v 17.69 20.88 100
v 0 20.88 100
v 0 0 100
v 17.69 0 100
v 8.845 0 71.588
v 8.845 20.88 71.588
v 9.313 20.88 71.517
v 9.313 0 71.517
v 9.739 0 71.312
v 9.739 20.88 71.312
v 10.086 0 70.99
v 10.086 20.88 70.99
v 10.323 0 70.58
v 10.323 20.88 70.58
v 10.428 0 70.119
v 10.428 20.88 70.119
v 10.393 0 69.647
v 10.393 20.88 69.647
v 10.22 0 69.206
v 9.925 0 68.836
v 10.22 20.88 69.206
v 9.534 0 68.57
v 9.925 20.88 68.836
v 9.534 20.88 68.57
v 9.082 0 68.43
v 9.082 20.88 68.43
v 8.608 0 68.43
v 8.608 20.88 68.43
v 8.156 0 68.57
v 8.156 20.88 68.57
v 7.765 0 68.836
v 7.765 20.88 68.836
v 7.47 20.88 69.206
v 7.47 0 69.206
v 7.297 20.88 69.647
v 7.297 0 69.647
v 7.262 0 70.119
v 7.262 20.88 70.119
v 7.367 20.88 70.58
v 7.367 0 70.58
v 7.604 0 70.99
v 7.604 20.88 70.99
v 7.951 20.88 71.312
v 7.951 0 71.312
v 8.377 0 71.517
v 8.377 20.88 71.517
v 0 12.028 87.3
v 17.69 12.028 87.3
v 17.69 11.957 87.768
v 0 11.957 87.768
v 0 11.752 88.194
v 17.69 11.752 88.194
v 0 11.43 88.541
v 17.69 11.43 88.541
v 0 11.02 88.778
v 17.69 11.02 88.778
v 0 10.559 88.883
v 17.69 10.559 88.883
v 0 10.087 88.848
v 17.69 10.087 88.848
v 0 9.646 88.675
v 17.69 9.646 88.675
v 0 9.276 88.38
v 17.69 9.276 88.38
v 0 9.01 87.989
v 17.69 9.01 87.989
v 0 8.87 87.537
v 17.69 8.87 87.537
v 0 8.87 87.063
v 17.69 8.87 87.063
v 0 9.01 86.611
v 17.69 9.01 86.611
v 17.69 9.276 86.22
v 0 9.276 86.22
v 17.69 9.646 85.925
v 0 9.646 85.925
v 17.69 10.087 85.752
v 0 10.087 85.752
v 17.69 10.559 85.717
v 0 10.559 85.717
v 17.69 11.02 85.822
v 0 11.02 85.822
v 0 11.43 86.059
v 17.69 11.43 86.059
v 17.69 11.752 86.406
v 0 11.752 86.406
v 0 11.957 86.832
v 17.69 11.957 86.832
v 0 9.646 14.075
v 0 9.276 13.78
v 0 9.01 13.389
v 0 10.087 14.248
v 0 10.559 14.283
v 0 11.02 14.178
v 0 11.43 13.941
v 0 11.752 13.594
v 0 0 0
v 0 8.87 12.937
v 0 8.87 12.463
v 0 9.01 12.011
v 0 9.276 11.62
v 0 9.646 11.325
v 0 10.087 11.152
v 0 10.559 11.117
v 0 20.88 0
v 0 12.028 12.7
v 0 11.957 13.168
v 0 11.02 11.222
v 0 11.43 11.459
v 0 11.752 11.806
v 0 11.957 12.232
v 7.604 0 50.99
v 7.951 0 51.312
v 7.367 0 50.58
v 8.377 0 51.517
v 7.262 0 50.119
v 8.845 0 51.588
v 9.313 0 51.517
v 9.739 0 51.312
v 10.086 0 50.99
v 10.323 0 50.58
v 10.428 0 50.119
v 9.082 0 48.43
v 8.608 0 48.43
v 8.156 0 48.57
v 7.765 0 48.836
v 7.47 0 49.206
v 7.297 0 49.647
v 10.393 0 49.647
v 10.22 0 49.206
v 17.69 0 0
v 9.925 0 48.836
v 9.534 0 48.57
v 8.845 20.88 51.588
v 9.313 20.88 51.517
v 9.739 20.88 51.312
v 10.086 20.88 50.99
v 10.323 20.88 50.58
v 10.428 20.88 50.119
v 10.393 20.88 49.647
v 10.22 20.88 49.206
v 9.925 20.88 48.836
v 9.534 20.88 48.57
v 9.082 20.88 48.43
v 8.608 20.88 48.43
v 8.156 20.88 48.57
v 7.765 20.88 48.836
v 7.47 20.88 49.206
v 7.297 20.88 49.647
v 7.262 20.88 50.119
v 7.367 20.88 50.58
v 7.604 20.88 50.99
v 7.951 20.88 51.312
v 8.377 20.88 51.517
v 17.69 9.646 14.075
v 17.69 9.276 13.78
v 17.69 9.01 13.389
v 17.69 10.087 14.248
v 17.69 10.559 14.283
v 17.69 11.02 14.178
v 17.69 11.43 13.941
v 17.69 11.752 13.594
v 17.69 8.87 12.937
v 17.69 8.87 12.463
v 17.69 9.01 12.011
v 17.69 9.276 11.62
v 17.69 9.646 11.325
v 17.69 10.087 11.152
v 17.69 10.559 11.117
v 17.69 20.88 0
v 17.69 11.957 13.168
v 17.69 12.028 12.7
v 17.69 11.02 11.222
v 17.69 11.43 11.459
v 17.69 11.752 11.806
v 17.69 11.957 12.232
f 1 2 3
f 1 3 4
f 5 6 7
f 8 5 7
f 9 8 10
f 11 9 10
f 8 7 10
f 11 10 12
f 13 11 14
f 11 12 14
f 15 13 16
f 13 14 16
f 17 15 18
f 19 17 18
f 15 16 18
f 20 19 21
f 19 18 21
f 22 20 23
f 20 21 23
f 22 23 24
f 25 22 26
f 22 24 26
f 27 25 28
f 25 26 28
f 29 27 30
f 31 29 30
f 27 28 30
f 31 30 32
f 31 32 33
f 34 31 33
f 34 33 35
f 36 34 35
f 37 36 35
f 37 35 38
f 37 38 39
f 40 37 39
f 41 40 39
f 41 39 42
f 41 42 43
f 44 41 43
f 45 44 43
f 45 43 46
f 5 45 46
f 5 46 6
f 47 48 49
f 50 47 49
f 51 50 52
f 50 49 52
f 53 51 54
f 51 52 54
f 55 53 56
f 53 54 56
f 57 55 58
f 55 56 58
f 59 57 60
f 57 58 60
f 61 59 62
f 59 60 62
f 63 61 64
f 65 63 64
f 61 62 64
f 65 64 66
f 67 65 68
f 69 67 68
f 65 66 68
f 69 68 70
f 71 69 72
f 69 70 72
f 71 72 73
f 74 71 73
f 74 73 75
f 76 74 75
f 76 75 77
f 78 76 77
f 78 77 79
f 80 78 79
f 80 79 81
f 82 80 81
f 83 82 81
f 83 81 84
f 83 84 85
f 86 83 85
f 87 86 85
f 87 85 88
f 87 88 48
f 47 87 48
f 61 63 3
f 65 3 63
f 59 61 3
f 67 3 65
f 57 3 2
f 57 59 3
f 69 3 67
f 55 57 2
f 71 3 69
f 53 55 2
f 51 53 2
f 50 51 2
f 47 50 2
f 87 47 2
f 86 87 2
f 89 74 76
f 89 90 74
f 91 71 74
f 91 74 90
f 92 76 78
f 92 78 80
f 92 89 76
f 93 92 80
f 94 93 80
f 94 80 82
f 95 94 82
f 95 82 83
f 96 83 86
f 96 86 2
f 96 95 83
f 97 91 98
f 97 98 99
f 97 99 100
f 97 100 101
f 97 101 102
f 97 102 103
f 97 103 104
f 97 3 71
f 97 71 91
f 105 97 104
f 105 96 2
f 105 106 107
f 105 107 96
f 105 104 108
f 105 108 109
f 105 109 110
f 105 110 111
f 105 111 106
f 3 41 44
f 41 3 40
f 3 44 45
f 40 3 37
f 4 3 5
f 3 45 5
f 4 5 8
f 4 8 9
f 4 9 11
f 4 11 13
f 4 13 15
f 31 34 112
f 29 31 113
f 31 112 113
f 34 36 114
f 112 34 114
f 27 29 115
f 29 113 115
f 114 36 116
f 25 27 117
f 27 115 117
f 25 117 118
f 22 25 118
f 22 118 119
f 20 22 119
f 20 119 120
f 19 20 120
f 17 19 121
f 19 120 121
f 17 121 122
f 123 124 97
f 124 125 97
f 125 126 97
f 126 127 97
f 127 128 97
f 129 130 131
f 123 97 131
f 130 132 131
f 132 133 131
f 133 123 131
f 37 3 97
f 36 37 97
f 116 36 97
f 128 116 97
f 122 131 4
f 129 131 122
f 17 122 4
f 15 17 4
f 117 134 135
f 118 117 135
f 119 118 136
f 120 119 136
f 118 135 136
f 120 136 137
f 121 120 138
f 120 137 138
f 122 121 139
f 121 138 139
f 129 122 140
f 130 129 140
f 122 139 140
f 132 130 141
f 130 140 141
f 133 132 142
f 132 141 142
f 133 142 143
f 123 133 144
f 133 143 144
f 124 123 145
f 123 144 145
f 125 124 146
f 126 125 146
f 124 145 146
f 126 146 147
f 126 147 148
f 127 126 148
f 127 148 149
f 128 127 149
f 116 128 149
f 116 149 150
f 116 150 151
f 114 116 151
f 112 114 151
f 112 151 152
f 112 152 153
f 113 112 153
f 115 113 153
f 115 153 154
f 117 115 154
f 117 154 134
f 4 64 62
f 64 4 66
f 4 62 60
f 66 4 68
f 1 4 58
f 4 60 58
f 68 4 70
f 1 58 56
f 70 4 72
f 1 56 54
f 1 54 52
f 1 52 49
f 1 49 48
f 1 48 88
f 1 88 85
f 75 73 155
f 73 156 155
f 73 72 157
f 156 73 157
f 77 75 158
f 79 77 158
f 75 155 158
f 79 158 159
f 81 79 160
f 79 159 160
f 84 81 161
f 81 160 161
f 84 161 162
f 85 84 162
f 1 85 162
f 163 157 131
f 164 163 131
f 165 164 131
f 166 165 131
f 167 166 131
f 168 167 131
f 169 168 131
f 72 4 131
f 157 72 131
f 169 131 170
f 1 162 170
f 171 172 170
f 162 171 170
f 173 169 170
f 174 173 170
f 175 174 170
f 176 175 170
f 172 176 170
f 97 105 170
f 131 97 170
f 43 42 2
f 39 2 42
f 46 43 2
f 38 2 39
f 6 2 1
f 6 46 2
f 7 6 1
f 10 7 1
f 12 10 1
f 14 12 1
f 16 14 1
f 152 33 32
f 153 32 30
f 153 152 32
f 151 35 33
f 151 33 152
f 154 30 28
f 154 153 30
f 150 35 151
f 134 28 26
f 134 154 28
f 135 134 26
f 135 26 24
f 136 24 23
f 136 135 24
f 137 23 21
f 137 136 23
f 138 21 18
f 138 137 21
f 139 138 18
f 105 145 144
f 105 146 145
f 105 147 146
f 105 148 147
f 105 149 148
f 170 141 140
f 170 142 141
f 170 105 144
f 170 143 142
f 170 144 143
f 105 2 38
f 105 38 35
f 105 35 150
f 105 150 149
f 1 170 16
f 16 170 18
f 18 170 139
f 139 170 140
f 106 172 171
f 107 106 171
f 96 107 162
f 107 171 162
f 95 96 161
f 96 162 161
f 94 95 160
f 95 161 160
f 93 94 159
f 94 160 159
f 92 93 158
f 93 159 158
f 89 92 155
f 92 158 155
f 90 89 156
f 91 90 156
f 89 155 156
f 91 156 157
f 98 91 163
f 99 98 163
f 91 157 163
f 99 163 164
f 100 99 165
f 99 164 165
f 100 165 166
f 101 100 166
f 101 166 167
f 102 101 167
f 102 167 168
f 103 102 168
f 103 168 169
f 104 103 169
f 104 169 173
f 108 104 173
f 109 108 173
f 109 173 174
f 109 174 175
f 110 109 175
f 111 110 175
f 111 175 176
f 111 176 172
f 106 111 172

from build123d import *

# Parameters (mm, degrees)
SKETCH1_W           = 17.69
SKETCH1_H           = 20.88
BOSS_EXTRUDE1_DEPTH = 100
SKETCH2_R           = 1.5875
CUT_EXTRUDE1_DEPTH  = 106.78
SKETCH3_R           = 1.5875
CUT_EXTRUDE2_DEPTH  = 100


with BuildPart() as part:
    # Sketch1 → Boss-Extrude1 (new body)
    with BuildSketch(Plane.XY):
        with Locations((8.845, 10.44)):
            Rectangle(SKETCH1_W, SKETCH1_H)
    extrude(amount=BOSS_EXTRUDE1_DEPTH)

    # Sketch2 → Cut-Extrude1 (cut)
    with BuildSketch(Plane(origin=(0, 20.88, 0), x_dir=(1, 0, 0), z_dir=(0, 1, 0))):
        with Locations(Location((8.845, -50, 0), (0, 0, 270))):
            Circle(SKETCH2_R)
        with Locations(Location((8.845, -70, 0), (0, 0, 270))):
            Circle(SKETCH2_R)
    extrude(amount=-CUT_EXTRUDE1_DEPTH, mode=Mode.SUBTRACT)

    # Sketch3 → Cut-Extrude2 (cut)
    with BuildSketch(Plane(origin=(17.69, 0, 0), x_dir=(0, 0, -1), z_dir=(1, 0, 0))):
        with Locations(Location((-87.3, 10.44, 0), (0, 0, 90))):
            Circle(SKETCH3_R)
        with Locations(Location((-12.7, 10.44, 0), (0, 0, 90))):
            Circle(SKETCH3_R)
    extrude(amount=-CUT_EXTRUDE2_DEPTH, mode=Mode.SUBTRACT)


solid = part.part
